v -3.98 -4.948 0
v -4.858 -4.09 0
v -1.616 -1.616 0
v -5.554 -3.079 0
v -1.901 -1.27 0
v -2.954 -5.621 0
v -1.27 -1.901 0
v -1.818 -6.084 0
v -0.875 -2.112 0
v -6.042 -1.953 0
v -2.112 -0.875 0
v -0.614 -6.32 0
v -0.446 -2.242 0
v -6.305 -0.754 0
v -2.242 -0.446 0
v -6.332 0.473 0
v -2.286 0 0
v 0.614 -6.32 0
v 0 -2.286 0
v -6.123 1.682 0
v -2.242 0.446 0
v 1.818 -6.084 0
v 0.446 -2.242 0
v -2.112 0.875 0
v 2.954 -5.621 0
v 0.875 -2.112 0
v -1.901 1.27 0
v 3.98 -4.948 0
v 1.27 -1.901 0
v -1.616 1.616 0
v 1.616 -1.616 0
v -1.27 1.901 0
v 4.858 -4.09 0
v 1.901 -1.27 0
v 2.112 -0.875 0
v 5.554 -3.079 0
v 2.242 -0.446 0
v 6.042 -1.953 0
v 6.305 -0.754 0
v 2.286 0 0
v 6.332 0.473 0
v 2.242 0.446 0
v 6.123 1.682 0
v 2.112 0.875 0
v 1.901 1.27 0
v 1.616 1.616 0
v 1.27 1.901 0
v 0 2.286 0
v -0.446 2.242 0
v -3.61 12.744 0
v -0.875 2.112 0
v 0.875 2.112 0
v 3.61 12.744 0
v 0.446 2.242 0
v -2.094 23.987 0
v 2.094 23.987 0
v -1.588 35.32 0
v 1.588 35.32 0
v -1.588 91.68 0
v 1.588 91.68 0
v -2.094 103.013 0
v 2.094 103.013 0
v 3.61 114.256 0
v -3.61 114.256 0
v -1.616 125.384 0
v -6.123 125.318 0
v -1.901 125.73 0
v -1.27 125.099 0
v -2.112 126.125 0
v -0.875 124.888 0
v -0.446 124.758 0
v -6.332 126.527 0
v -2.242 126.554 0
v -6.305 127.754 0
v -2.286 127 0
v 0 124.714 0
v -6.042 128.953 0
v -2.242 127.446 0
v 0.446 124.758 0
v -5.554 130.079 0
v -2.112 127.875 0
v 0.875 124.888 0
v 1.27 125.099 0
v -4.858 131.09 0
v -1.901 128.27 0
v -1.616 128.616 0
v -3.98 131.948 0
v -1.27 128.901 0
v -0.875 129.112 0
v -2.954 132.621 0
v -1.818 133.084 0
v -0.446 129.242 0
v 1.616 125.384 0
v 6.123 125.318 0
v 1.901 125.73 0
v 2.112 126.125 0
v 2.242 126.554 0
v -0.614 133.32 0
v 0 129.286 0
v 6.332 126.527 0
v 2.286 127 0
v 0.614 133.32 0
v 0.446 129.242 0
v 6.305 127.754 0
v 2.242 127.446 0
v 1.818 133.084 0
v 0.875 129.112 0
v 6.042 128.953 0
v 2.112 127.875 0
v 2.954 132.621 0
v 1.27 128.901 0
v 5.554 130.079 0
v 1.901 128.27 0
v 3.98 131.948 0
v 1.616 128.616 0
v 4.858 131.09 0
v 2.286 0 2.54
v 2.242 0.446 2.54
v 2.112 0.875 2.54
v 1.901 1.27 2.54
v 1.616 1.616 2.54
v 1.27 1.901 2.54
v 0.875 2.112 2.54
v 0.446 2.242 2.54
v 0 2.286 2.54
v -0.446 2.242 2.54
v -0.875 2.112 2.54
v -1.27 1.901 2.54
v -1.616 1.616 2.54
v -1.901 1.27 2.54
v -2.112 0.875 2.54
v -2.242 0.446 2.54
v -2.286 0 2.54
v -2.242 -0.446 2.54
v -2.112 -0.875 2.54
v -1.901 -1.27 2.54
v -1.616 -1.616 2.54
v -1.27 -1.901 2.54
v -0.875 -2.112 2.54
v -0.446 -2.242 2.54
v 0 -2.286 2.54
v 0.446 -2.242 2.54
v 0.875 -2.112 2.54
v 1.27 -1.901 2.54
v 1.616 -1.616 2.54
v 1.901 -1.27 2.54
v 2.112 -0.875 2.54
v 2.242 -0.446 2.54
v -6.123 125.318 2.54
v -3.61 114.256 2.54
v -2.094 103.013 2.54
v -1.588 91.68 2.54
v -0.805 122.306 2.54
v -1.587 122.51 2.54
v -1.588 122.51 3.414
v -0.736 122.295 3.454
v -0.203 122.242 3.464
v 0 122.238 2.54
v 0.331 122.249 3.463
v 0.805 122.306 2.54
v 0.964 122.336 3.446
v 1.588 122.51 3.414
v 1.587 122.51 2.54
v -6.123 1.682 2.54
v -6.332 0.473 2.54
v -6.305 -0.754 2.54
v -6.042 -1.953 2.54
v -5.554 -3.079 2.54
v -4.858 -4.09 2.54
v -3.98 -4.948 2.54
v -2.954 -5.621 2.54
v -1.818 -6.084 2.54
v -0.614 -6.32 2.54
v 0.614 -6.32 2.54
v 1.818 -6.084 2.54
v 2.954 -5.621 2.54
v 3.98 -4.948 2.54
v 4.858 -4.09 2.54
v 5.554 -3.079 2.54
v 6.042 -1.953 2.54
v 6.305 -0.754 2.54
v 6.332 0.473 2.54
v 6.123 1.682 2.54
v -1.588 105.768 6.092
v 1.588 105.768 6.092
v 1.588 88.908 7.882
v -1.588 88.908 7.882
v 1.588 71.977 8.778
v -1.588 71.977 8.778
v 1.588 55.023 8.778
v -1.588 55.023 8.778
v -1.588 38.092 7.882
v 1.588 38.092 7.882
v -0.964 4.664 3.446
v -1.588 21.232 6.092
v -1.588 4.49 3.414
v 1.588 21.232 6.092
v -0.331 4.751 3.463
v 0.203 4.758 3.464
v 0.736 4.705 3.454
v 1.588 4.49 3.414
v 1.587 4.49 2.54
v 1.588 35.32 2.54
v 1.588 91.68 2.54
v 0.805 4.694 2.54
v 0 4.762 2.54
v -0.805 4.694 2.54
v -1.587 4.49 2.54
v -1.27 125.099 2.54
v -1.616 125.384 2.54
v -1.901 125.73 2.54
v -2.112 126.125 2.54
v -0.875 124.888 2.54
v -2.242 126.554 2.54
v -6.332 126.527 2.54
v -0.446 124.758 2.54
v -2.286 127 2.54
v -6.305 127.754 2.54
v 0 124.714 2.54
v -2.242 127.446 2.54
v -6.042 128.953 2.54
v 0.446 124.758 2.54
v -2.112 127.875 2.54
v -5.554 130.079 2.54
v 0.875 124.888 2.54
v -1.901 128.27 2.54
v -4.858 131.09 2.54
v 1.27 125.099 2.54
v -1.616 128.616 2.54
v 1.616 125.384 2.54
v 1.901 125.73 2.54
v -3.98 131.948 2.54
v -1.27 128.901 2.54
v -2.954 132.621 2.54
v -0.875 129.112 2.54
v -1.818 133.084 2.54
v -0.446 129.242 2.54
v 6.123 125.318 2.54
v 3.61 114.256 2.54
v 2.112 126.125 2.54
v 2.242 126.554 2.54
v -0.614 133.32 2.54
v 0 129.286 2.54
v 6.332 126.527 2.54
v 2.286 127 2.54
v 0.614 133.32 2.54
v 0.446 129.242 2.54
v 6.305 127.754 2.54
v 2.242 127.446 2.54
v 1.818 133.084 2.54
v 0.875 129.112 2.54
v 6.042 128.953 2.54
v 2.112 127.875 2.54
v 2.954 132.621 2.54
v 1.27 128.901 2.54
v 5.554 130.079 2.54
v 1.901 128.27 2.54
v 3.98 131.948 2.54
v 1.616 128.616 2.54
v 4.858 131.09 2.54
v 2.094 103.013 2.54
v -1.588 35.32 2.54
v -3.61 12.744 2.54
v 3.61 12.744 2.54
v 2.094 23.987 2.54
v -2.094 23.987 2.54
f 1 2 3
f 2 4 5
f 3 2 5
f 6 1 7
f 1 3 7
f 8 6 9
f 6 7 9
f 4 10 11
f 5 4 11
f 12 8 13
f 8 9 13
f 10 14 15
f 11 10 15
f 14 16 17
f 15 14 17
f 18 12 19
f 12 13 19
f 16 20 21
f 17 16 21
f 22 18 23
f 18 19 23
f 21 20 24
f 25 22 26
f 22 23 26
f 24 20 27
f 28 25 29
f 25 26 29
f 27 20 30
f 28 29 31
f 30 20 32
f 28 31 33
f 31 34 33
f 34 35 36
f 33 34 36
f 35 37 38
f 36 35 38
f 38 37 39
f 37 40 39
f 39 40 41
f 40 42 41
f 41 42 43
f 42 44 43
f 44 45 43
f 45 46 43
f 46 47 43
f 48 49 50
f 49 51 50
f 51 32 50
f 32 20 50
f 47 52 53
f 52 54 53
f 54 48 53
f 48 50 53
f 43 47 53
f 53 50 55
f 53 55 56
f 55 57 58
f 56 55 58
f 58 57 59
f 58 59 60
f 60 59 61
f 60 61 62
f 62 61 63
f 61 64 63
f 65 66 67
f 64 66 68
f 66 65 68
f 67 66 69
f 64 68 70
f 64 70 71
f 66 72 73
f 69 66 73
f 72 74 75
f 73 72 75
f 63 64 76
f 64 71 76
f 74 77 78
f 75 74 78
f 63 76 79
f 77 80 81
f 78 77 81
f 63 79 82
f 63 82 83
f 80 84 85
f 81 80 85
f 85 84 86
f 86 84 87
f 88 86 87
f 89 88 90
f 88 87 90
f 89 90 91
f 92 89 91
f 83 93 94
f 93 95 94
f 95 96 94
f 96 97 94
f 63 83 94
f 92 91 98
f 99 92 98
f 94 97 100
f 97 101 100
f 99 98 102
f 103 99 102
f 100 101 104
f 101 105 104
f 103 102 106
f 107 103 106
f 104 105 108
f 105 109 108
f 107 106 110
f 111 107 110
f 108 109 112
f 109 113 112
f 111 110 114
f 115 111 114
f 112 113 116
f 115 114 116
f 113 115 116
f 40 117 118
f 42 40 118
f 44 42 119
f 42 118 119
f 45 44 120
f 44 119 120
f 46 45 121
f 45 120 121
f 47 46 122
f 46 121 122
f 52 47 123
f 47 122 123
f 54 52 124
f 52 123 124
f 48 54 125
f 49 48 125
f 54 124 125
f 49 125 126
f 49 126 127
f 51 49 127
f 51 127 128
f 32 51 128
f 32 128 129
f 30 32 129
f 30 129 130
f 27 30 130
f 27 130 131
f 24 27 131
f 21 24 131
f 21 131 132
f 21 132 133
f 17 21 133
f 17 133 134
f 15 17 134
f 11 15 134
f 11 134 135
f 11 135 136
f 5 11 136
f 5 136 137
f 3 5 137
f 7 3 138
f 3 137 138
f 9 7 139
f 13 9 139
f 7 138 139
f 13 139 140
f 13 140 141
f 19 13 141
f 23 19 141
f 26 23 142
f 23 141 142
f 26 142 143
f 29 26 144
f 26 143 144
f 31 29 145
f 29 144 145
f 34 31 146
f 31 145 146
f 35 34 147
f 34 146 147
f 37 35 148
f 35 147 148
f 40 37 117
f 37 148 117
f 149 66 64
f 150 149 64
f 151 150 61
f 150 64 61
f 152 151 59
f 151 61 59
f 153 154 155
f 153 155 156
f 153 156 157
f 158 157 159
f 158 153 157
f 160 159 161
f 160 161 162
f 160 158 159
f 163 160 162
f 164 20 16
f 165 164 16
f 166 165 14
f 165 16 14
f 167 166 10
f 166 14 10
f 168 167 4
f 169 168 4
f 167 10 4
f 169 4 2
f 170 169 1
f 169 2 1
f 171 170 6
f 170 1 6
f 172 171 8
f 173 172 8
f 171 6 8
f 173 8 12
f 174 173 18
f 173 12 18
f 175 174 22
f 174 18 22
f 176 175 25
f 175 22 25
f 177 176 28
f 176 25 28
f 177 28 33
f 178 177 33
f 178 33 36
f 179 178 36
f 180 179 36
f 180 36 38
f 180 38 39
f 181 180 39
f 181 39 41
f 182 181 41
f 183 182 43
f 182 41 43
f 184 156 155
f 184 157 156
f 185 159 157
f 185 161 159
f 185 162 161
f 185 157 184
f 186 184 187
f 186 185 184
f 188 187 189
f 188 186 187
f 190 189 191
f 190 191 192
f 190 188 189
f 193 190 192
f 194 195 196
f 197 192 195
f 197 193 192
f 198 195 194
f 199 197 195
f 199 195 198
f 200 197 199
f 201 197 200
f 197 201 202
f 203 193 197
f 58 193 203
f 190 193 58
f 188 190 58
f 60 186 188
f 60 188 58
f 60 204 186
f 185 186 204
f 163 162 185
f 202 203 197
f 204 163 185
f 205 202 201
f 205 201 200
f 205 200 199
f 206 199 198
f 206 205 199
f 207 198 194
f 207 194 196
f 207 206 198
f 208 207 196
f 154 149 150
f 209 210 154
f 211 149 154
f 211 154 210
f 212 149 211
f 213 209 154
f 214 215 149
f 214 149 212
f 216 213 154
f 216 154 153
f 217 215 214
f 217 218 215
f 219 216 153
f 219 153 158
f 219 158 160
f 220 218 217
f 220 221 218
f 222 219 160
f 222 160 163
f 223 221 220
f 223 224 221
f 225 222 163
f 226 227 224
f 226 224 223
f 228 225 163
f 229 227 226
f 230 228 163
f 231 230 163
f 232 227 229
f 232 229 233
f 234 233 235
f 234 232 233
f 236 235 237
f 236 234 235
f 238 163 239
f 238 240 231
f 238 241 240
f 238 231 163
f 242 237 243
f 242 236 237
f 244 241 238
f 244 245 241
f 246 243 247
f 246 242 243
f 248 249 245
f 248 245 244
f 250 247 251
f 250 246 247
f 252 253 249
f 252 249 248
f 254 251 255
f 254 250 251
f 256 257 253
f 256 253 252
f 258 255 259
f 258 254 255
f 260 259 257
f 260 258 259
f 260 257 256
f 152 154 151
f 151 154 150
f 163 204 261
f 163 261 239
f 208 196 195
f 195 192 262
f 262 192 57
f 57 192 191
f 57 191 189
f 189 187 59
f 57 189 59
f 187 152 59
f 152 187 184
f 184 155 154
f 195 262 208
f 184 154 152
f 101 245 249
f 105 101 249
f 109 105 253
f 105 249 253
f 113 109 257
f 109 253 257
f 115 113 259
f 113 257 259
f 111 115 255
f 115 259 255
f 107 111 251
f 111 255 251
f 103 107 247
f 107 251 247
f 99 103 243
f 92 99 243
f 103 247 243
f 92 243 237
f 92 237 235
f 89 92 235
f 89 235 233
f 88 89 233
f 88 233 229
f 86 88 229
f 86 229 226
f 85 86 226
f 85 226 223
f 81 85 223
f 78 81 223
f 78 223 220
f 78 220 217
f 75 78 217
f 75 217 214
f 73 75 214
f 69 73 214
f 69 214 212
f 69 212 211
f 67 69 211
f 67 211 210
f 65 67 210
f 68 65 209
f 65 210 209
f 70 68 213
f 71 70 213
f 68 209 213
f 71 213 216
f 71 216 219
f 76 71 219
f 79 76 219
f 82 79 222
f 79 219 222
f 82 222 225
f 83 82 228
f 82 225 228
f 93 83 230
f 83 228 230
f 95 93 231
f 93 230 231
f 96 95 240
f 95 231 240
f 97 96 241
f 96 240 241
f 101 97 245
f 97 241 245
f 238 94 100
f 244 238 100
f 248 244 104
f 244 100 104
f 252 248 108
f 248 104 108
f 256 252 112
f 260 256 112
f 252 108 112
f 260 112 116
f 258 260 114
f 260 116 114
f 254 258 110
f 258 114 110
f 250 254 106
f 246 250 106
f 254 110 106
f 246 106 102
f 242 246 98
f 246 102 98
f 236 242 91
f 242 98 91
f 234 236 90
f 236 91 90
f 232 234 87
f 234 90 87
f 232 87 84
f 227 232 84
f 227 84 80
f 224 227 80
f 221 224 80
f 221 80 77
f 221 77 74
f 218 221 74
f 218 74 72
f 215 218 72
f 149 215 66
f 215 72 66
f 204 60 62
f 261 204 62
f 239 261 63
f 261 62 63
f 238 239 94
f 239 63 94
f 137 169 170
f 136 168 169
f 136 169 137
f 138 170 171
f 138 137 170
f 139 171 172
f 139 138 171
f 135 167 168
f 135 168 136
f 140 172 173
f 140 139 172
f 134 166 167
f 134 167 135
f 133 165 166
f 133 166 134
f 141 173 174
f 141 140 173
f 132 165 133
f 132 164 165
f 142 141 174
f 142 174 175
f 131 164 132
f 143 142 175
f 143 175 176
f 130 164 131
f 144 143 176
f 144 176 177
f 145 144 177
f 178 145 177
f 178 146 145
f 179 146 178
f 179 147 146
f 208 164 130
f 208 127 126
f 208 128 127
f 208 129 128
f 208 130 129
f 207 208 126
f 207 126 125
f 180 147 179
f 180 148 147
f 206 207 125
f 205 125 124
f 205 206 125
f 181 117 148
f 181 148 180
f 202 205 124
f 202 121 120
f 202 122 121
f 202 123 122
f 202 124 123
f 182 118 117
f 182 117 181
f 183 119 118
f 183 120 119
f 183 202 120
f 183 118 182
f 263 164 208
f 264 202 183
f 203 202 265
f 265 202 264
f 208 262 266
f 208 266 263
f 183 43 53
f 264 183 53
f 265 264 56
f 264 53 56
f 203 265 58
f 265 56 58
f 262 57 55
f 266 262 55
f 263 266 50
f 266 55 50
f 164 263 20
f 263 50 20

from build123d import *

# Parameters (mm, degrees)
BOSS_EXTRUDE1_DEPTH = 2.54
BOSS_EXTRUDE2_DEPTH = 1.5875
SKETCH4_R           = 4.7625
CUT_EXTRUDE1_DEPTH  = 134.652038892
SKETCH5_R           = 2.286
CUT_EXTRUDE2_DEPTH  = 134.652038897


with BuildPart() as part:
    # Sketch1 → Boss-Extrude1 (new body)
    with BuildSketch(Plane.XY):
        with BuildLine():
            Line((-1.5875, 91.680354705), (-1.5875, 35.319645295))
            ThreePointArc((-1.5875, 35.319645295), (-2.726536461, 18.348556433), (-6.123214286, 1.681887871))
            ThreePointArc((-6.123214286, 1.681887871), (0, -6.35), (6.123214286, 1.681887871))
            ThreePointArc((6.123214286, 1.681887871), (2.726536461, 18.348556433), (1.5875, 35.319645295))
            Line((1.5875, 35.319645295), (1.5875, 91.680354705))
            ThreePointArc((1.5875, 91.680354705), (2.726536461, 108.651443567), (6.123214286, 125.318112129))
            ThreePointArc((6.123214286, 125.318112129), (0, 133.35), (-6.123214286, 125.318112129))
            ThreePointArc((-6.123214286, 125.318112129), (-2.726536461, 108.651443567), (-1.5875, 91.680354705))
        make_face()
    extrude(amount=BOSS_EXTRUDE1_DEPTH)

    # Sketch3 → Boss-Extrude2 (add, symmetric)
    with BuildSketch(Plane(origin=(0, 0, 0), x_dir=(0, 0, -1), z_dir=(1, 0, 0))):
        with BuildLine():
            Line((-2.54, 0), (-2.54, 127))
            ThreePointArc((-2.54, 127), (-8.89, 63.5), (-2.54, 0))
        make_face()
    extrude(amount=BOSS_EXTRUDE2_DEPTH, both=True)

    # Sketch4 → Cut-Extrude1 (cut, through all)
    with BuildSketch(Plane.XY.offset(2.54)):
        Circle(SKETCH4_R)
        with Locations((0, 127)):
            Circle(SKETCH4_R)
    extrude(amount=CUT_EXTRUDE1_DEPTH, mode=Mode.SUBTRACT)

    # Sketch5 → Cut-Extrude2 (cut, through all)
    with BuildSketch(Plane.XY.offset(2.54)):
        Circle(SKETCH5_R)
        with Locations((0, 127)):
            Circle(SKETCH5_R)
    extrude(amount=-CUT_EXTRUDE2_DEPTH, mode=Mode.SUBTRACT)


solid = part.part
